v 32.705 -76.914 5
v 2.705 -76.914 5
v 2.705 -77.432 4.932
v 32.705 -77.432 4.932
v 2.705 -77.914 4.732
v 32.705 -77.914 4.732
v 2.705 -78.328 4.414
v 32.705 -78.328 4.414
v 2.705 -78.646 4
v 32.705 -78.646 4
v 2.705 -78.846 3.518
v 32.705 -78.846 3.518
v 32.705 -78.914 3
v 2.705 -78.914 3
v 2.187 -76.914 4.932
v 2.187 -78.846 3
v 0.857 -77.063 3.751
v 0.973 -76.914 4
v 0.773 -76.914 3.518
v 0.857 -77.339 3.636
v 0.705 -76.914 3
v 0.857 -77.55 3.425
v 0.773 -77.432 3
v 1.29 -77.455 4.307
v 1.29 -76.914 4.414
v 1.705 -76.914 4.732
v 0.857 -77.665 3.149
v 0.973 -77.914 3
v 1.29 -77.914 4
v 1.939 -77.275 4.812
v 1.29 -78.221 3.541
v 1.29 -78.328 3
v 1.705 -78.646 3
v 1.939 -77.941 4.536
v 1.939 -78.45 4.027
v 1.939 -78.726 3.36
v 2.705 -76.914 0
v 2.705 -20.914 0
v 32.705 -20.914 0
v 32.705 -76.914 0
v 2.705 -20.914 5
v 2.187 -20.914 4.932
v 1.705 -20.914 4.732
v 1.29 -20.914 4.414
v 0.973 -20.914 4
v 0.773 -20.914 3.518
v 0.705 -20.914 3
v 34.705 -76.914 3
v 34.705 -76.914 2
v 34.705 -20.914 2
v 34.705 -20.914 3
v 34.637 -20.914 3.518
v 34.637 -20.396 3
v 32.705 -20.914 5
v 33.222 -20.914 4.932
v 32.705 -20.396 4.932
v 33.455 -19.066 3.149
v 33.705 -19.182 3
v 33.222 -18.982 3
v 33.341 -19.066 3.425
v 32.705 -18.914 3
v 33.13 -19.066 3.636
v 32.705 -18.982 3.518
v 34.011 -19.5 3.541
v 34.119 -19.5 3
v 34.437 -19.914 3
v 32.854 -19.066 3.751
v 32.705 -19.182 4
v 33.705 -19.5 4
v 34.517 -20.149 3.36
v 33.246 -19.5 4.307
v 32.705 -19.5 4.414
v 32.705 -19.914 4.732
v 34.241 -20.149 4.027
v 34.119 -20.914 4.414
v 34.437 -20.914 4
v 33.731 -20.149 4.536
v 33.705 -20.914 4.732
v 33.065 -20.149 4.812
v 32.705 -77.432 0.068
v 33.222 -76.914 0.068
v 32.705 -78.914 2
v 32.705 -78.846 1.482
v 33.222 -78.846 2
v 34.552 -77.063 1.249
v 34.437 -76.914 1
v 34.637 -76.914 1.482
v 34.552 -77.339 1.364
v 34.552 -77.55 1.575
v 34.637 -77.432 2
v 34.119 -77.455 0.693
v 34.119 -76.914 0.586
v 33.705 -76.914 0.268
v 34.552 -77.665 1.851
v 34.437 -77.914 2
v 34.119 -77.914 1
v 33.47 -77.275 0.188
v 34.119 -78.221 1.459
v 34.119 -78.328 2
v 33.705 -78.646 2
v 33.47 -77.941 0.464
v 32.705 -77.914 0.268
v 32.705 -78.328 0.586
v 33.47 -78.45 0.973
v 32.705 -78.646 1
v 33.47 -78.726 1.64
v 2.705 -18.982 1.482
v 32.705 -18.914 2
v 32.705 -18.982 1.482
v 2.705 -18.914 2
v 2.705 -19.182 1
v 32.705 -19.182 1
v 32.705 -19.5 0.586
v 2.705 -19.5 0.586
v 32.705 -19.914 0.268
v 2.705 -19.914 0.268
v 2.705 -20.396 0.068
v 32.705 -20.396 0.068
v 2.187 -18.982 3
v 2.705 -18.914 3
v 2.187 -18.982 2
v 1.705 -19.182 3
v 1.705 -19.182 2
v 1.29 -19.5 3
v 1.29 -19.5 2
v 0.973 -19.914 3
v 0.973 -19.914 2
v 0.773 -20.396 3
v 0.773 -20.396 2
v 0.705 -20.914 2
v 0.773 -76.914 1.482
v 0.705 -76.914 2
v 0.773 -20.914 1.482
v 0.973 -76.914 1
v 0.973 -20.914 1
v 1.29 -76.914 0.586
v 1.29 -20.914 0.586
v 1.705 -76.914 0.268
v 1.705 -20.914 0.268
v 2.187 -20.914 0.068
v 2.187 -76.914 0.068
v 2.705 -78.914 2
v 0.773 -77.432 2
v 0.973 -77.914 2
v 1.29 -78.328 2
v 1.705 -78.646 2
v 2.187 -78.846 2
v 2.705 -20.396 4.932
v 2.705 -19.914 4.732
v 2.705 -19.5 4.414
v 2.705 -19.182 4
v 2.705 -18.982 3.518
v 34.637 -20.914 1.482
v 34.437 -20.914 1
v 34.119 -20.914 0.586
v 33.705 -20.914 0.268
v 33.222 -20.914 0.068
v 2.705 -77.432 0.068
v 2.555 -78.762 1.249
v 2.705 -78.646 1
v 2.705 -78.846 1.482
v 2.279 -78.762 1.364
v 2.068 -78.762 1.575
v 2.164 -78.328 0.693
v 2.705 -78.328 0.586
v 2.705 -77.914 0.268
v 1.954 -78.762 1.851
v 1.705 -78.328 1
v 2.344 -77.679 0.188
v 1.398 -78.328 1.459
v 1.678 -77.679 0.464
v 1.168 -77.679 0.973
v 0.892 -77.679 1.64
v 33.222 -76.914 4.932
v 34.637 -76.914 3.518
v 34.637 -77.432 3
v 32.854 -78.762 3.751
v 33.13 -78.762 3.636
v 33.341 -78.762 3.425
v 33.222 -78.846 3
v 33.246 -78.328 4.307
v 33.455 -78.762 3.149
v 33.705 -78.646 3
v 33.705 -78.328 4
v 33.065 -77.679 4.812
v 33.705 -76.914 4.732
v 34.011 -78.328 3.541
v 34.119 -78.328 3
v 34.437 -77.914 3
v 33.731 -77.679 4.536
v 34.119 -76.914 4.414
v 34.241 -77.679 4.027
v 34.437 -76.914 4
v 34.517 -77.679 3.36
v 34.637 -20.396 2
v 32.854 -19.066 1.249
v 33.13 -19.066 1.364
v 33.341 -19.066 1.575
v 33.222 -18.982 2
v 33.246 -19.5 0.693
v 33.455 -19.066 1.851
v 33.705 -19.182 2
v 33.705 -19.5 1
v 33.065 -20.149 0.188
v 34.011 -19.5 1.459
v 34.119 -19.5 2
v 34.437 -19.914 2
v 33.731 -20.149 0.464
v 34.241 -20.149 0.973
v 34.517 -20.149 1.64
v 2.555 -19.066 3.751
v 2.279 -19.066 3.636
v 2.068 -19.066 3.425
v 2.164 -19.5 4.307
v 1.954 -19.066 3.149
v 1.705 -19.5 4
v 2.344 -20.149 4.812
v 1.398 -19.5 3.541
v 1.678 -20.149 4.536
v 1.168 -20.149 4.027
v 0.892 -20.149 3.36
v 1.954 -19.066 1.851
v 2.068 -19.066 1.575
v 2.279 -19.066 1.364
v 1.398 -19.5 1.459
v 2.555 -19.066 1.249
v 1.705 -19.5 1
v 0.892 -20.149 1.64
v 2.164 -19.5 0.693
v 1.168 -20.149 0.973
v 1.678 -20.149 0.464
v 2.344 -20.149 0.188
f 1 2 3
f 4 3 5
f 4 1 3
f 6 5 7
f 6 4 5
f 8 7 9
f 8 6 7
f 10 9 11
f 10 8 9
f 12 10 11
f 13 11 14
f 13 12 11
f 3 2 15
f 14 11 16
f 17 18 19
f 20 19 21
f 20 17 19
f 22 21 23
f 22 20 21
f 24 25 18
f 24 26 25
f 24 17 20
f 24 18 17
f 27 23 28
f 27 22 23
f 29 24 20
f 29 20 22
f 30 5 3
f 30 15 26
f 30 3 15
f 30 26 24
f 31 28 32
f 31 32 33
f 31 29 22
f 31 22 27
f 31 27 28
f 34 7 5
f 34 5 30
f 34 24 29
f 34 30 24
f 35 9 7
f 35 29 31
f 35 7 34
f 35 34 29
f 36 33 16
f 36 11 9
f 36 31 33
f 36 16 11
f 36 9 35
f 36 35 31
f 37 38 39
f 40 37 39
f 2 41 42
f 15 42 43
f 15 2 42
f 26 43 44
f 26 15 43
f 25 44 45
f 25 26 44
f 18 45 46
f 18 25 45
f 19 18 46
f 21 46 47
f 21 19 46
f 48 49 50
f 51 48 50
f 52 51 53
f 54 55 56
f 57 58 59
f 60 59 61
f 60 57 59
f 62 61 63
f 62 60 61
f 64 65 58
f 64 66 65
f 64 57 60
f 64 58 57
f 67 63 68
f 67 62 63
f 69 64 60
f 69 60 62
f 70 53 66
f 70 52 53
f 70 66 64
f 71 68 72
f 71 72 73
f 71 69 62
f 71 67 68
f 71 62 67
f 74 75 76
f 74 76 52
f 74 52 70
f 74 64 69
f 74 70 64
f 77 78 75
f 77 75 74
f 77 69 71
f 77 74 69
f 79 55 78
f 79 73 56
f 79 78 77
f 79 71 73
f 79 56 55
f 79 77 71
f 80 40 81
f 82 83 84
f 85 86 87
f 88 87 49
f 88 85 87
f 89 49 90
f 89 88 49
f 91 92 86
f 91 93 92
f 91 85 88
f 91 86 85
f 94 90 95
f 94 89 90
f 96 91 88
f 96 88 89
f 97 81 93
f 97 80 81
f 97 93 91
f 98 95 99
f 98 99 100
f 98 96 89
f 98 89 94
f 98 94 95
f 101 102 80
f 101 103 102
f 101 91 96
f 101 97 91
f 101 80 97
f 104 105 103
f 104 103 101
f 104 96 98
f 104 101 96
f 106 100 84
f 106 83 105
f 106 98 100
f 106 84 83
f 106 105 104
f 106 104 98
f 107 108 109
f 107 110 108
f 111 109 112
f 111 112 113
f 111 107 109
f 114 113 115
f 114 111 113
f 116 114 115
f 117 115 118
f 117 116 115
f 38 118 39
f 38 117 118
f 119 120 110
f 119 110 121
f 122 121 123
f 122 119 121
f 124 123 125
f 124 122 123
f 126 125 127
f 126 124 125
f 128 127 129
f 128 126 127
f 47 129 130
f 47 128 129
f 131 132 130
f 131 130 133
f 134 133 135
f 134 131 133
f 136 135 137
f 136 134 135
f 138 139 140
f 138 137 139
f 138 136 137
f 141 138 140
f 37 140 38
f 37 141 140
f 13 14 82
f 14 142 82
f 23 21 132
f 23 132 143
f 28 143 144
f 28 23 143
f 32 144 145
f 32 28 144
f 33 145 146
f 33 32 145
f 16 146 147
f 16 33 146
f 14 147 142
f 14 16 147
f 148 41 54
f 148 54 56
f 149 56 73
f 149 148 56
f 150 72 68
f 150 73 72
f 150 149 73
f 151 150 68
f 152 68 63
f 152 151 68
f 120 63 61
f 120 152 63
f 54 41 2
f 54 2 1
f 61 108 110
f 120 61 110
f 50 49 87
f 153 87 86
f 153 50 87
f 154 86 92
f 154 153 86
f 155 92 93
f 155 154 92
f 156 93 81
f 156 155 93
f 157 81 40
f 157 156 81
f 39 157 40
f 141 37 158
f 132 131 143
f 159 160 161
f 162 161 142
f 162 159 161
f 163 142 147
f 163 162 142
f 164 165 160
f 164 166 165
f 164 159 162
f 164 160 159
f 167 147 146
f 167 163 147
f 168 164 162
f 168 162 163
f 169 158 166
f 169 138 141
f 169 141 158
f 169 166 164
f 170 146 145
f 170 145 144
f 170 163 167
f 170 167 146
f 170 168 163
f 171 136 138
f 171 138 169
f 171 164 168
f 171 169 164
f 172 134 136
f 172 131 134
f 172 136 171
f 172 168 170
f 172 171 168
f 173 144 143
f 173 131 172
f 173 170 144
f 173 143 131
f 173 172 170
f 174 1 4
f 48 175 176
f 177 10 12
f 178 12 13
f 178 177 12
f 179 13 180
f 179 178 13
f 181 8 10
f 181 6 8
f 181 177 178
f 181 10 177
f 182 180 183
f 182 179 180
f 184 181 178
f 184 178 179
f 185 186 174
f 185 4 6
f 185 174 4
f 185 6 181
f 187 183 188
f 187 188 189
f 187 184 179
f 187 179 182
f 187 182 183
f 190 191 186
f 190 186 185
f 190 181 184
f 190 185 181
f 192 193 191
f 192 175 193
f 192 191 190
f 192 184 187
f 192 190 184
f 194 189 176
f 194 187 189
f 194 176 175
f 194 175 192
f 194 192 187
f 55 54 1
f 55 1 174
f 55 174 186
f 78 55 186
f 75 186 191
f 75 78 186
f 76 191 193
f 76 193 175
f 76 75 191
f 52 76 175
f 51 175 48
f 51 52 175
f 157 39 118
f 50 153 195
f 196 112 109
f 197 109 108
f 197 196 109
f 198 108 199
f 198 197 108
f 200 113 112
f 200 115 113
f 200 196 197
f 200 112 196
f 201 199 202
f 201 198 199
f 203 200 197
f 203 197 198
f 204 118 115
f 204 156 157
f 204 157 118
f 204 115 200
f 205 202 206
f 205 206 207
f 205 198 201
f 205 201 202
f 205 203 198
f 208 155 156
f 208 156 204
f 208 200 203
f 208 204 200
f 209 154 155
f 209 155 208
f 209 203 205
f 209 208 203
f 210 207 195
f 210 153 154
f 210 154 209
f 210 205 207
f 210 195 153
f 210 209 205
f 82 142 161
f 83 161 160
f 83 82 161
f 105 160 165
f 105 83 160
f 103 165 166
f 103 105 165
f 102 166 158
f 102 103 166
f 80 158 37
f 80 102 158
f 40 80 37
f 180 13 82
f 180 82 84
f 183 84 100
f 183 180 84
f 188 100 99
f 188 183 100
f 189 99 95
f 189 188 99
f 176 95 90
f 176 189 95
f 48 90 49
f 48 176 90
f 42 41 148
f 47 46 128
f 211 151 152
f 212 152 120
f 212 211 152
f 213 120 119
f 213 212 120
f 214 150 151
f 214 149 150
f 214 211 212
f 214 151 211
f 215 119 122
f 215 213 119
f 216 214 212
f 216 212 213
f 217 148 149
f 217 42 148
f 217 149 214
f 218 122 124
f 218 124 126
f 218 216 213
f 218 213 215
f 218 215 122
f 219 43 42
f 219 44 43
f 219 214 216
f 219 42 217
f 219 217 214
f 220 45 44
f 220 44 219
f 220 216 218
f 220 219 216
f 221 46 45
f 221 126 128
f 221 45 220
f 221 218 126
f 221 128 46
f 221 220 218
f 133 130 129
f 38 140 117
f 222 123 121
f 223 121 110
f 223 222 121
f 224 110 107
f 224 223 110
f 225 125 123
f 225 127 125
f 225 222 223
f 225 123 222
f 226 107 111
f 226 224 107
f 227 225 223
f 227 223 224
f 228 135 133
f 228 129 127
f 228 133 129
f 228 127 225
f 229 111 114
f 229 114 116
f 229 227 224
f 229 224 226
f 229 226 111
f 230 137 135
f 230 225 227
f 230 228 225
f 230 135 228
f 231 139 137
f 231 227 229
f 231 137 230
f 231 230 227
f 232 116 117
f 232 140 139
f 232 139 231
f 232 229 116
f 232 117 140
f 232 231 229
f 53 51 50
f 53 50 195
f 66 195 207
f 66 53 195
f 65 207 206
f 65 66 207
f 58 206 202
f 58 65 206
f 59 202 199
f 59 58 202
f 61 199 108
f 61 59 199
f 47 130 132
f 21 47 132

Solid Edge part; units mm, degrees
sketch "Sketch1" plane through (0, 0, 0) normal (0, 0, 1) x (1, 0, 0)
  line L0 (0.7047, -78.9141) -> (34.7047, -78.9141)
  line L1 (34.7047, -78.9141) -> (34.7047, -18.9141)
  line L2 (34.7047, -18.9141) -> (0.7047, -18.9141)
  line L3 (0.7047, -18.9141) -> (0.7047, -78.9141)
extrude "Protrusion1" add sketch "Sketch1" along normal blind 5
fillet "Round_1" radius 2 12 edges at (0.7047, -48.9141, 0) (17.7047, -78.9141, 0) (34.7047, -48.9141, 0) (17.7047, -18.9141, 0) (34.7047, -48.9141, 5) (17.7047, -78.9141, 5) (0.7047, -48.9141, 5) (17.7047, -18.9141, 5) (0.7047, -18.9141, 2.5) (0.7047, -78.9141, 2.5) (34.7047, -78.9141, 2.5) (34.7047, -18.9141, 2.5)
properties material "Zinc"
